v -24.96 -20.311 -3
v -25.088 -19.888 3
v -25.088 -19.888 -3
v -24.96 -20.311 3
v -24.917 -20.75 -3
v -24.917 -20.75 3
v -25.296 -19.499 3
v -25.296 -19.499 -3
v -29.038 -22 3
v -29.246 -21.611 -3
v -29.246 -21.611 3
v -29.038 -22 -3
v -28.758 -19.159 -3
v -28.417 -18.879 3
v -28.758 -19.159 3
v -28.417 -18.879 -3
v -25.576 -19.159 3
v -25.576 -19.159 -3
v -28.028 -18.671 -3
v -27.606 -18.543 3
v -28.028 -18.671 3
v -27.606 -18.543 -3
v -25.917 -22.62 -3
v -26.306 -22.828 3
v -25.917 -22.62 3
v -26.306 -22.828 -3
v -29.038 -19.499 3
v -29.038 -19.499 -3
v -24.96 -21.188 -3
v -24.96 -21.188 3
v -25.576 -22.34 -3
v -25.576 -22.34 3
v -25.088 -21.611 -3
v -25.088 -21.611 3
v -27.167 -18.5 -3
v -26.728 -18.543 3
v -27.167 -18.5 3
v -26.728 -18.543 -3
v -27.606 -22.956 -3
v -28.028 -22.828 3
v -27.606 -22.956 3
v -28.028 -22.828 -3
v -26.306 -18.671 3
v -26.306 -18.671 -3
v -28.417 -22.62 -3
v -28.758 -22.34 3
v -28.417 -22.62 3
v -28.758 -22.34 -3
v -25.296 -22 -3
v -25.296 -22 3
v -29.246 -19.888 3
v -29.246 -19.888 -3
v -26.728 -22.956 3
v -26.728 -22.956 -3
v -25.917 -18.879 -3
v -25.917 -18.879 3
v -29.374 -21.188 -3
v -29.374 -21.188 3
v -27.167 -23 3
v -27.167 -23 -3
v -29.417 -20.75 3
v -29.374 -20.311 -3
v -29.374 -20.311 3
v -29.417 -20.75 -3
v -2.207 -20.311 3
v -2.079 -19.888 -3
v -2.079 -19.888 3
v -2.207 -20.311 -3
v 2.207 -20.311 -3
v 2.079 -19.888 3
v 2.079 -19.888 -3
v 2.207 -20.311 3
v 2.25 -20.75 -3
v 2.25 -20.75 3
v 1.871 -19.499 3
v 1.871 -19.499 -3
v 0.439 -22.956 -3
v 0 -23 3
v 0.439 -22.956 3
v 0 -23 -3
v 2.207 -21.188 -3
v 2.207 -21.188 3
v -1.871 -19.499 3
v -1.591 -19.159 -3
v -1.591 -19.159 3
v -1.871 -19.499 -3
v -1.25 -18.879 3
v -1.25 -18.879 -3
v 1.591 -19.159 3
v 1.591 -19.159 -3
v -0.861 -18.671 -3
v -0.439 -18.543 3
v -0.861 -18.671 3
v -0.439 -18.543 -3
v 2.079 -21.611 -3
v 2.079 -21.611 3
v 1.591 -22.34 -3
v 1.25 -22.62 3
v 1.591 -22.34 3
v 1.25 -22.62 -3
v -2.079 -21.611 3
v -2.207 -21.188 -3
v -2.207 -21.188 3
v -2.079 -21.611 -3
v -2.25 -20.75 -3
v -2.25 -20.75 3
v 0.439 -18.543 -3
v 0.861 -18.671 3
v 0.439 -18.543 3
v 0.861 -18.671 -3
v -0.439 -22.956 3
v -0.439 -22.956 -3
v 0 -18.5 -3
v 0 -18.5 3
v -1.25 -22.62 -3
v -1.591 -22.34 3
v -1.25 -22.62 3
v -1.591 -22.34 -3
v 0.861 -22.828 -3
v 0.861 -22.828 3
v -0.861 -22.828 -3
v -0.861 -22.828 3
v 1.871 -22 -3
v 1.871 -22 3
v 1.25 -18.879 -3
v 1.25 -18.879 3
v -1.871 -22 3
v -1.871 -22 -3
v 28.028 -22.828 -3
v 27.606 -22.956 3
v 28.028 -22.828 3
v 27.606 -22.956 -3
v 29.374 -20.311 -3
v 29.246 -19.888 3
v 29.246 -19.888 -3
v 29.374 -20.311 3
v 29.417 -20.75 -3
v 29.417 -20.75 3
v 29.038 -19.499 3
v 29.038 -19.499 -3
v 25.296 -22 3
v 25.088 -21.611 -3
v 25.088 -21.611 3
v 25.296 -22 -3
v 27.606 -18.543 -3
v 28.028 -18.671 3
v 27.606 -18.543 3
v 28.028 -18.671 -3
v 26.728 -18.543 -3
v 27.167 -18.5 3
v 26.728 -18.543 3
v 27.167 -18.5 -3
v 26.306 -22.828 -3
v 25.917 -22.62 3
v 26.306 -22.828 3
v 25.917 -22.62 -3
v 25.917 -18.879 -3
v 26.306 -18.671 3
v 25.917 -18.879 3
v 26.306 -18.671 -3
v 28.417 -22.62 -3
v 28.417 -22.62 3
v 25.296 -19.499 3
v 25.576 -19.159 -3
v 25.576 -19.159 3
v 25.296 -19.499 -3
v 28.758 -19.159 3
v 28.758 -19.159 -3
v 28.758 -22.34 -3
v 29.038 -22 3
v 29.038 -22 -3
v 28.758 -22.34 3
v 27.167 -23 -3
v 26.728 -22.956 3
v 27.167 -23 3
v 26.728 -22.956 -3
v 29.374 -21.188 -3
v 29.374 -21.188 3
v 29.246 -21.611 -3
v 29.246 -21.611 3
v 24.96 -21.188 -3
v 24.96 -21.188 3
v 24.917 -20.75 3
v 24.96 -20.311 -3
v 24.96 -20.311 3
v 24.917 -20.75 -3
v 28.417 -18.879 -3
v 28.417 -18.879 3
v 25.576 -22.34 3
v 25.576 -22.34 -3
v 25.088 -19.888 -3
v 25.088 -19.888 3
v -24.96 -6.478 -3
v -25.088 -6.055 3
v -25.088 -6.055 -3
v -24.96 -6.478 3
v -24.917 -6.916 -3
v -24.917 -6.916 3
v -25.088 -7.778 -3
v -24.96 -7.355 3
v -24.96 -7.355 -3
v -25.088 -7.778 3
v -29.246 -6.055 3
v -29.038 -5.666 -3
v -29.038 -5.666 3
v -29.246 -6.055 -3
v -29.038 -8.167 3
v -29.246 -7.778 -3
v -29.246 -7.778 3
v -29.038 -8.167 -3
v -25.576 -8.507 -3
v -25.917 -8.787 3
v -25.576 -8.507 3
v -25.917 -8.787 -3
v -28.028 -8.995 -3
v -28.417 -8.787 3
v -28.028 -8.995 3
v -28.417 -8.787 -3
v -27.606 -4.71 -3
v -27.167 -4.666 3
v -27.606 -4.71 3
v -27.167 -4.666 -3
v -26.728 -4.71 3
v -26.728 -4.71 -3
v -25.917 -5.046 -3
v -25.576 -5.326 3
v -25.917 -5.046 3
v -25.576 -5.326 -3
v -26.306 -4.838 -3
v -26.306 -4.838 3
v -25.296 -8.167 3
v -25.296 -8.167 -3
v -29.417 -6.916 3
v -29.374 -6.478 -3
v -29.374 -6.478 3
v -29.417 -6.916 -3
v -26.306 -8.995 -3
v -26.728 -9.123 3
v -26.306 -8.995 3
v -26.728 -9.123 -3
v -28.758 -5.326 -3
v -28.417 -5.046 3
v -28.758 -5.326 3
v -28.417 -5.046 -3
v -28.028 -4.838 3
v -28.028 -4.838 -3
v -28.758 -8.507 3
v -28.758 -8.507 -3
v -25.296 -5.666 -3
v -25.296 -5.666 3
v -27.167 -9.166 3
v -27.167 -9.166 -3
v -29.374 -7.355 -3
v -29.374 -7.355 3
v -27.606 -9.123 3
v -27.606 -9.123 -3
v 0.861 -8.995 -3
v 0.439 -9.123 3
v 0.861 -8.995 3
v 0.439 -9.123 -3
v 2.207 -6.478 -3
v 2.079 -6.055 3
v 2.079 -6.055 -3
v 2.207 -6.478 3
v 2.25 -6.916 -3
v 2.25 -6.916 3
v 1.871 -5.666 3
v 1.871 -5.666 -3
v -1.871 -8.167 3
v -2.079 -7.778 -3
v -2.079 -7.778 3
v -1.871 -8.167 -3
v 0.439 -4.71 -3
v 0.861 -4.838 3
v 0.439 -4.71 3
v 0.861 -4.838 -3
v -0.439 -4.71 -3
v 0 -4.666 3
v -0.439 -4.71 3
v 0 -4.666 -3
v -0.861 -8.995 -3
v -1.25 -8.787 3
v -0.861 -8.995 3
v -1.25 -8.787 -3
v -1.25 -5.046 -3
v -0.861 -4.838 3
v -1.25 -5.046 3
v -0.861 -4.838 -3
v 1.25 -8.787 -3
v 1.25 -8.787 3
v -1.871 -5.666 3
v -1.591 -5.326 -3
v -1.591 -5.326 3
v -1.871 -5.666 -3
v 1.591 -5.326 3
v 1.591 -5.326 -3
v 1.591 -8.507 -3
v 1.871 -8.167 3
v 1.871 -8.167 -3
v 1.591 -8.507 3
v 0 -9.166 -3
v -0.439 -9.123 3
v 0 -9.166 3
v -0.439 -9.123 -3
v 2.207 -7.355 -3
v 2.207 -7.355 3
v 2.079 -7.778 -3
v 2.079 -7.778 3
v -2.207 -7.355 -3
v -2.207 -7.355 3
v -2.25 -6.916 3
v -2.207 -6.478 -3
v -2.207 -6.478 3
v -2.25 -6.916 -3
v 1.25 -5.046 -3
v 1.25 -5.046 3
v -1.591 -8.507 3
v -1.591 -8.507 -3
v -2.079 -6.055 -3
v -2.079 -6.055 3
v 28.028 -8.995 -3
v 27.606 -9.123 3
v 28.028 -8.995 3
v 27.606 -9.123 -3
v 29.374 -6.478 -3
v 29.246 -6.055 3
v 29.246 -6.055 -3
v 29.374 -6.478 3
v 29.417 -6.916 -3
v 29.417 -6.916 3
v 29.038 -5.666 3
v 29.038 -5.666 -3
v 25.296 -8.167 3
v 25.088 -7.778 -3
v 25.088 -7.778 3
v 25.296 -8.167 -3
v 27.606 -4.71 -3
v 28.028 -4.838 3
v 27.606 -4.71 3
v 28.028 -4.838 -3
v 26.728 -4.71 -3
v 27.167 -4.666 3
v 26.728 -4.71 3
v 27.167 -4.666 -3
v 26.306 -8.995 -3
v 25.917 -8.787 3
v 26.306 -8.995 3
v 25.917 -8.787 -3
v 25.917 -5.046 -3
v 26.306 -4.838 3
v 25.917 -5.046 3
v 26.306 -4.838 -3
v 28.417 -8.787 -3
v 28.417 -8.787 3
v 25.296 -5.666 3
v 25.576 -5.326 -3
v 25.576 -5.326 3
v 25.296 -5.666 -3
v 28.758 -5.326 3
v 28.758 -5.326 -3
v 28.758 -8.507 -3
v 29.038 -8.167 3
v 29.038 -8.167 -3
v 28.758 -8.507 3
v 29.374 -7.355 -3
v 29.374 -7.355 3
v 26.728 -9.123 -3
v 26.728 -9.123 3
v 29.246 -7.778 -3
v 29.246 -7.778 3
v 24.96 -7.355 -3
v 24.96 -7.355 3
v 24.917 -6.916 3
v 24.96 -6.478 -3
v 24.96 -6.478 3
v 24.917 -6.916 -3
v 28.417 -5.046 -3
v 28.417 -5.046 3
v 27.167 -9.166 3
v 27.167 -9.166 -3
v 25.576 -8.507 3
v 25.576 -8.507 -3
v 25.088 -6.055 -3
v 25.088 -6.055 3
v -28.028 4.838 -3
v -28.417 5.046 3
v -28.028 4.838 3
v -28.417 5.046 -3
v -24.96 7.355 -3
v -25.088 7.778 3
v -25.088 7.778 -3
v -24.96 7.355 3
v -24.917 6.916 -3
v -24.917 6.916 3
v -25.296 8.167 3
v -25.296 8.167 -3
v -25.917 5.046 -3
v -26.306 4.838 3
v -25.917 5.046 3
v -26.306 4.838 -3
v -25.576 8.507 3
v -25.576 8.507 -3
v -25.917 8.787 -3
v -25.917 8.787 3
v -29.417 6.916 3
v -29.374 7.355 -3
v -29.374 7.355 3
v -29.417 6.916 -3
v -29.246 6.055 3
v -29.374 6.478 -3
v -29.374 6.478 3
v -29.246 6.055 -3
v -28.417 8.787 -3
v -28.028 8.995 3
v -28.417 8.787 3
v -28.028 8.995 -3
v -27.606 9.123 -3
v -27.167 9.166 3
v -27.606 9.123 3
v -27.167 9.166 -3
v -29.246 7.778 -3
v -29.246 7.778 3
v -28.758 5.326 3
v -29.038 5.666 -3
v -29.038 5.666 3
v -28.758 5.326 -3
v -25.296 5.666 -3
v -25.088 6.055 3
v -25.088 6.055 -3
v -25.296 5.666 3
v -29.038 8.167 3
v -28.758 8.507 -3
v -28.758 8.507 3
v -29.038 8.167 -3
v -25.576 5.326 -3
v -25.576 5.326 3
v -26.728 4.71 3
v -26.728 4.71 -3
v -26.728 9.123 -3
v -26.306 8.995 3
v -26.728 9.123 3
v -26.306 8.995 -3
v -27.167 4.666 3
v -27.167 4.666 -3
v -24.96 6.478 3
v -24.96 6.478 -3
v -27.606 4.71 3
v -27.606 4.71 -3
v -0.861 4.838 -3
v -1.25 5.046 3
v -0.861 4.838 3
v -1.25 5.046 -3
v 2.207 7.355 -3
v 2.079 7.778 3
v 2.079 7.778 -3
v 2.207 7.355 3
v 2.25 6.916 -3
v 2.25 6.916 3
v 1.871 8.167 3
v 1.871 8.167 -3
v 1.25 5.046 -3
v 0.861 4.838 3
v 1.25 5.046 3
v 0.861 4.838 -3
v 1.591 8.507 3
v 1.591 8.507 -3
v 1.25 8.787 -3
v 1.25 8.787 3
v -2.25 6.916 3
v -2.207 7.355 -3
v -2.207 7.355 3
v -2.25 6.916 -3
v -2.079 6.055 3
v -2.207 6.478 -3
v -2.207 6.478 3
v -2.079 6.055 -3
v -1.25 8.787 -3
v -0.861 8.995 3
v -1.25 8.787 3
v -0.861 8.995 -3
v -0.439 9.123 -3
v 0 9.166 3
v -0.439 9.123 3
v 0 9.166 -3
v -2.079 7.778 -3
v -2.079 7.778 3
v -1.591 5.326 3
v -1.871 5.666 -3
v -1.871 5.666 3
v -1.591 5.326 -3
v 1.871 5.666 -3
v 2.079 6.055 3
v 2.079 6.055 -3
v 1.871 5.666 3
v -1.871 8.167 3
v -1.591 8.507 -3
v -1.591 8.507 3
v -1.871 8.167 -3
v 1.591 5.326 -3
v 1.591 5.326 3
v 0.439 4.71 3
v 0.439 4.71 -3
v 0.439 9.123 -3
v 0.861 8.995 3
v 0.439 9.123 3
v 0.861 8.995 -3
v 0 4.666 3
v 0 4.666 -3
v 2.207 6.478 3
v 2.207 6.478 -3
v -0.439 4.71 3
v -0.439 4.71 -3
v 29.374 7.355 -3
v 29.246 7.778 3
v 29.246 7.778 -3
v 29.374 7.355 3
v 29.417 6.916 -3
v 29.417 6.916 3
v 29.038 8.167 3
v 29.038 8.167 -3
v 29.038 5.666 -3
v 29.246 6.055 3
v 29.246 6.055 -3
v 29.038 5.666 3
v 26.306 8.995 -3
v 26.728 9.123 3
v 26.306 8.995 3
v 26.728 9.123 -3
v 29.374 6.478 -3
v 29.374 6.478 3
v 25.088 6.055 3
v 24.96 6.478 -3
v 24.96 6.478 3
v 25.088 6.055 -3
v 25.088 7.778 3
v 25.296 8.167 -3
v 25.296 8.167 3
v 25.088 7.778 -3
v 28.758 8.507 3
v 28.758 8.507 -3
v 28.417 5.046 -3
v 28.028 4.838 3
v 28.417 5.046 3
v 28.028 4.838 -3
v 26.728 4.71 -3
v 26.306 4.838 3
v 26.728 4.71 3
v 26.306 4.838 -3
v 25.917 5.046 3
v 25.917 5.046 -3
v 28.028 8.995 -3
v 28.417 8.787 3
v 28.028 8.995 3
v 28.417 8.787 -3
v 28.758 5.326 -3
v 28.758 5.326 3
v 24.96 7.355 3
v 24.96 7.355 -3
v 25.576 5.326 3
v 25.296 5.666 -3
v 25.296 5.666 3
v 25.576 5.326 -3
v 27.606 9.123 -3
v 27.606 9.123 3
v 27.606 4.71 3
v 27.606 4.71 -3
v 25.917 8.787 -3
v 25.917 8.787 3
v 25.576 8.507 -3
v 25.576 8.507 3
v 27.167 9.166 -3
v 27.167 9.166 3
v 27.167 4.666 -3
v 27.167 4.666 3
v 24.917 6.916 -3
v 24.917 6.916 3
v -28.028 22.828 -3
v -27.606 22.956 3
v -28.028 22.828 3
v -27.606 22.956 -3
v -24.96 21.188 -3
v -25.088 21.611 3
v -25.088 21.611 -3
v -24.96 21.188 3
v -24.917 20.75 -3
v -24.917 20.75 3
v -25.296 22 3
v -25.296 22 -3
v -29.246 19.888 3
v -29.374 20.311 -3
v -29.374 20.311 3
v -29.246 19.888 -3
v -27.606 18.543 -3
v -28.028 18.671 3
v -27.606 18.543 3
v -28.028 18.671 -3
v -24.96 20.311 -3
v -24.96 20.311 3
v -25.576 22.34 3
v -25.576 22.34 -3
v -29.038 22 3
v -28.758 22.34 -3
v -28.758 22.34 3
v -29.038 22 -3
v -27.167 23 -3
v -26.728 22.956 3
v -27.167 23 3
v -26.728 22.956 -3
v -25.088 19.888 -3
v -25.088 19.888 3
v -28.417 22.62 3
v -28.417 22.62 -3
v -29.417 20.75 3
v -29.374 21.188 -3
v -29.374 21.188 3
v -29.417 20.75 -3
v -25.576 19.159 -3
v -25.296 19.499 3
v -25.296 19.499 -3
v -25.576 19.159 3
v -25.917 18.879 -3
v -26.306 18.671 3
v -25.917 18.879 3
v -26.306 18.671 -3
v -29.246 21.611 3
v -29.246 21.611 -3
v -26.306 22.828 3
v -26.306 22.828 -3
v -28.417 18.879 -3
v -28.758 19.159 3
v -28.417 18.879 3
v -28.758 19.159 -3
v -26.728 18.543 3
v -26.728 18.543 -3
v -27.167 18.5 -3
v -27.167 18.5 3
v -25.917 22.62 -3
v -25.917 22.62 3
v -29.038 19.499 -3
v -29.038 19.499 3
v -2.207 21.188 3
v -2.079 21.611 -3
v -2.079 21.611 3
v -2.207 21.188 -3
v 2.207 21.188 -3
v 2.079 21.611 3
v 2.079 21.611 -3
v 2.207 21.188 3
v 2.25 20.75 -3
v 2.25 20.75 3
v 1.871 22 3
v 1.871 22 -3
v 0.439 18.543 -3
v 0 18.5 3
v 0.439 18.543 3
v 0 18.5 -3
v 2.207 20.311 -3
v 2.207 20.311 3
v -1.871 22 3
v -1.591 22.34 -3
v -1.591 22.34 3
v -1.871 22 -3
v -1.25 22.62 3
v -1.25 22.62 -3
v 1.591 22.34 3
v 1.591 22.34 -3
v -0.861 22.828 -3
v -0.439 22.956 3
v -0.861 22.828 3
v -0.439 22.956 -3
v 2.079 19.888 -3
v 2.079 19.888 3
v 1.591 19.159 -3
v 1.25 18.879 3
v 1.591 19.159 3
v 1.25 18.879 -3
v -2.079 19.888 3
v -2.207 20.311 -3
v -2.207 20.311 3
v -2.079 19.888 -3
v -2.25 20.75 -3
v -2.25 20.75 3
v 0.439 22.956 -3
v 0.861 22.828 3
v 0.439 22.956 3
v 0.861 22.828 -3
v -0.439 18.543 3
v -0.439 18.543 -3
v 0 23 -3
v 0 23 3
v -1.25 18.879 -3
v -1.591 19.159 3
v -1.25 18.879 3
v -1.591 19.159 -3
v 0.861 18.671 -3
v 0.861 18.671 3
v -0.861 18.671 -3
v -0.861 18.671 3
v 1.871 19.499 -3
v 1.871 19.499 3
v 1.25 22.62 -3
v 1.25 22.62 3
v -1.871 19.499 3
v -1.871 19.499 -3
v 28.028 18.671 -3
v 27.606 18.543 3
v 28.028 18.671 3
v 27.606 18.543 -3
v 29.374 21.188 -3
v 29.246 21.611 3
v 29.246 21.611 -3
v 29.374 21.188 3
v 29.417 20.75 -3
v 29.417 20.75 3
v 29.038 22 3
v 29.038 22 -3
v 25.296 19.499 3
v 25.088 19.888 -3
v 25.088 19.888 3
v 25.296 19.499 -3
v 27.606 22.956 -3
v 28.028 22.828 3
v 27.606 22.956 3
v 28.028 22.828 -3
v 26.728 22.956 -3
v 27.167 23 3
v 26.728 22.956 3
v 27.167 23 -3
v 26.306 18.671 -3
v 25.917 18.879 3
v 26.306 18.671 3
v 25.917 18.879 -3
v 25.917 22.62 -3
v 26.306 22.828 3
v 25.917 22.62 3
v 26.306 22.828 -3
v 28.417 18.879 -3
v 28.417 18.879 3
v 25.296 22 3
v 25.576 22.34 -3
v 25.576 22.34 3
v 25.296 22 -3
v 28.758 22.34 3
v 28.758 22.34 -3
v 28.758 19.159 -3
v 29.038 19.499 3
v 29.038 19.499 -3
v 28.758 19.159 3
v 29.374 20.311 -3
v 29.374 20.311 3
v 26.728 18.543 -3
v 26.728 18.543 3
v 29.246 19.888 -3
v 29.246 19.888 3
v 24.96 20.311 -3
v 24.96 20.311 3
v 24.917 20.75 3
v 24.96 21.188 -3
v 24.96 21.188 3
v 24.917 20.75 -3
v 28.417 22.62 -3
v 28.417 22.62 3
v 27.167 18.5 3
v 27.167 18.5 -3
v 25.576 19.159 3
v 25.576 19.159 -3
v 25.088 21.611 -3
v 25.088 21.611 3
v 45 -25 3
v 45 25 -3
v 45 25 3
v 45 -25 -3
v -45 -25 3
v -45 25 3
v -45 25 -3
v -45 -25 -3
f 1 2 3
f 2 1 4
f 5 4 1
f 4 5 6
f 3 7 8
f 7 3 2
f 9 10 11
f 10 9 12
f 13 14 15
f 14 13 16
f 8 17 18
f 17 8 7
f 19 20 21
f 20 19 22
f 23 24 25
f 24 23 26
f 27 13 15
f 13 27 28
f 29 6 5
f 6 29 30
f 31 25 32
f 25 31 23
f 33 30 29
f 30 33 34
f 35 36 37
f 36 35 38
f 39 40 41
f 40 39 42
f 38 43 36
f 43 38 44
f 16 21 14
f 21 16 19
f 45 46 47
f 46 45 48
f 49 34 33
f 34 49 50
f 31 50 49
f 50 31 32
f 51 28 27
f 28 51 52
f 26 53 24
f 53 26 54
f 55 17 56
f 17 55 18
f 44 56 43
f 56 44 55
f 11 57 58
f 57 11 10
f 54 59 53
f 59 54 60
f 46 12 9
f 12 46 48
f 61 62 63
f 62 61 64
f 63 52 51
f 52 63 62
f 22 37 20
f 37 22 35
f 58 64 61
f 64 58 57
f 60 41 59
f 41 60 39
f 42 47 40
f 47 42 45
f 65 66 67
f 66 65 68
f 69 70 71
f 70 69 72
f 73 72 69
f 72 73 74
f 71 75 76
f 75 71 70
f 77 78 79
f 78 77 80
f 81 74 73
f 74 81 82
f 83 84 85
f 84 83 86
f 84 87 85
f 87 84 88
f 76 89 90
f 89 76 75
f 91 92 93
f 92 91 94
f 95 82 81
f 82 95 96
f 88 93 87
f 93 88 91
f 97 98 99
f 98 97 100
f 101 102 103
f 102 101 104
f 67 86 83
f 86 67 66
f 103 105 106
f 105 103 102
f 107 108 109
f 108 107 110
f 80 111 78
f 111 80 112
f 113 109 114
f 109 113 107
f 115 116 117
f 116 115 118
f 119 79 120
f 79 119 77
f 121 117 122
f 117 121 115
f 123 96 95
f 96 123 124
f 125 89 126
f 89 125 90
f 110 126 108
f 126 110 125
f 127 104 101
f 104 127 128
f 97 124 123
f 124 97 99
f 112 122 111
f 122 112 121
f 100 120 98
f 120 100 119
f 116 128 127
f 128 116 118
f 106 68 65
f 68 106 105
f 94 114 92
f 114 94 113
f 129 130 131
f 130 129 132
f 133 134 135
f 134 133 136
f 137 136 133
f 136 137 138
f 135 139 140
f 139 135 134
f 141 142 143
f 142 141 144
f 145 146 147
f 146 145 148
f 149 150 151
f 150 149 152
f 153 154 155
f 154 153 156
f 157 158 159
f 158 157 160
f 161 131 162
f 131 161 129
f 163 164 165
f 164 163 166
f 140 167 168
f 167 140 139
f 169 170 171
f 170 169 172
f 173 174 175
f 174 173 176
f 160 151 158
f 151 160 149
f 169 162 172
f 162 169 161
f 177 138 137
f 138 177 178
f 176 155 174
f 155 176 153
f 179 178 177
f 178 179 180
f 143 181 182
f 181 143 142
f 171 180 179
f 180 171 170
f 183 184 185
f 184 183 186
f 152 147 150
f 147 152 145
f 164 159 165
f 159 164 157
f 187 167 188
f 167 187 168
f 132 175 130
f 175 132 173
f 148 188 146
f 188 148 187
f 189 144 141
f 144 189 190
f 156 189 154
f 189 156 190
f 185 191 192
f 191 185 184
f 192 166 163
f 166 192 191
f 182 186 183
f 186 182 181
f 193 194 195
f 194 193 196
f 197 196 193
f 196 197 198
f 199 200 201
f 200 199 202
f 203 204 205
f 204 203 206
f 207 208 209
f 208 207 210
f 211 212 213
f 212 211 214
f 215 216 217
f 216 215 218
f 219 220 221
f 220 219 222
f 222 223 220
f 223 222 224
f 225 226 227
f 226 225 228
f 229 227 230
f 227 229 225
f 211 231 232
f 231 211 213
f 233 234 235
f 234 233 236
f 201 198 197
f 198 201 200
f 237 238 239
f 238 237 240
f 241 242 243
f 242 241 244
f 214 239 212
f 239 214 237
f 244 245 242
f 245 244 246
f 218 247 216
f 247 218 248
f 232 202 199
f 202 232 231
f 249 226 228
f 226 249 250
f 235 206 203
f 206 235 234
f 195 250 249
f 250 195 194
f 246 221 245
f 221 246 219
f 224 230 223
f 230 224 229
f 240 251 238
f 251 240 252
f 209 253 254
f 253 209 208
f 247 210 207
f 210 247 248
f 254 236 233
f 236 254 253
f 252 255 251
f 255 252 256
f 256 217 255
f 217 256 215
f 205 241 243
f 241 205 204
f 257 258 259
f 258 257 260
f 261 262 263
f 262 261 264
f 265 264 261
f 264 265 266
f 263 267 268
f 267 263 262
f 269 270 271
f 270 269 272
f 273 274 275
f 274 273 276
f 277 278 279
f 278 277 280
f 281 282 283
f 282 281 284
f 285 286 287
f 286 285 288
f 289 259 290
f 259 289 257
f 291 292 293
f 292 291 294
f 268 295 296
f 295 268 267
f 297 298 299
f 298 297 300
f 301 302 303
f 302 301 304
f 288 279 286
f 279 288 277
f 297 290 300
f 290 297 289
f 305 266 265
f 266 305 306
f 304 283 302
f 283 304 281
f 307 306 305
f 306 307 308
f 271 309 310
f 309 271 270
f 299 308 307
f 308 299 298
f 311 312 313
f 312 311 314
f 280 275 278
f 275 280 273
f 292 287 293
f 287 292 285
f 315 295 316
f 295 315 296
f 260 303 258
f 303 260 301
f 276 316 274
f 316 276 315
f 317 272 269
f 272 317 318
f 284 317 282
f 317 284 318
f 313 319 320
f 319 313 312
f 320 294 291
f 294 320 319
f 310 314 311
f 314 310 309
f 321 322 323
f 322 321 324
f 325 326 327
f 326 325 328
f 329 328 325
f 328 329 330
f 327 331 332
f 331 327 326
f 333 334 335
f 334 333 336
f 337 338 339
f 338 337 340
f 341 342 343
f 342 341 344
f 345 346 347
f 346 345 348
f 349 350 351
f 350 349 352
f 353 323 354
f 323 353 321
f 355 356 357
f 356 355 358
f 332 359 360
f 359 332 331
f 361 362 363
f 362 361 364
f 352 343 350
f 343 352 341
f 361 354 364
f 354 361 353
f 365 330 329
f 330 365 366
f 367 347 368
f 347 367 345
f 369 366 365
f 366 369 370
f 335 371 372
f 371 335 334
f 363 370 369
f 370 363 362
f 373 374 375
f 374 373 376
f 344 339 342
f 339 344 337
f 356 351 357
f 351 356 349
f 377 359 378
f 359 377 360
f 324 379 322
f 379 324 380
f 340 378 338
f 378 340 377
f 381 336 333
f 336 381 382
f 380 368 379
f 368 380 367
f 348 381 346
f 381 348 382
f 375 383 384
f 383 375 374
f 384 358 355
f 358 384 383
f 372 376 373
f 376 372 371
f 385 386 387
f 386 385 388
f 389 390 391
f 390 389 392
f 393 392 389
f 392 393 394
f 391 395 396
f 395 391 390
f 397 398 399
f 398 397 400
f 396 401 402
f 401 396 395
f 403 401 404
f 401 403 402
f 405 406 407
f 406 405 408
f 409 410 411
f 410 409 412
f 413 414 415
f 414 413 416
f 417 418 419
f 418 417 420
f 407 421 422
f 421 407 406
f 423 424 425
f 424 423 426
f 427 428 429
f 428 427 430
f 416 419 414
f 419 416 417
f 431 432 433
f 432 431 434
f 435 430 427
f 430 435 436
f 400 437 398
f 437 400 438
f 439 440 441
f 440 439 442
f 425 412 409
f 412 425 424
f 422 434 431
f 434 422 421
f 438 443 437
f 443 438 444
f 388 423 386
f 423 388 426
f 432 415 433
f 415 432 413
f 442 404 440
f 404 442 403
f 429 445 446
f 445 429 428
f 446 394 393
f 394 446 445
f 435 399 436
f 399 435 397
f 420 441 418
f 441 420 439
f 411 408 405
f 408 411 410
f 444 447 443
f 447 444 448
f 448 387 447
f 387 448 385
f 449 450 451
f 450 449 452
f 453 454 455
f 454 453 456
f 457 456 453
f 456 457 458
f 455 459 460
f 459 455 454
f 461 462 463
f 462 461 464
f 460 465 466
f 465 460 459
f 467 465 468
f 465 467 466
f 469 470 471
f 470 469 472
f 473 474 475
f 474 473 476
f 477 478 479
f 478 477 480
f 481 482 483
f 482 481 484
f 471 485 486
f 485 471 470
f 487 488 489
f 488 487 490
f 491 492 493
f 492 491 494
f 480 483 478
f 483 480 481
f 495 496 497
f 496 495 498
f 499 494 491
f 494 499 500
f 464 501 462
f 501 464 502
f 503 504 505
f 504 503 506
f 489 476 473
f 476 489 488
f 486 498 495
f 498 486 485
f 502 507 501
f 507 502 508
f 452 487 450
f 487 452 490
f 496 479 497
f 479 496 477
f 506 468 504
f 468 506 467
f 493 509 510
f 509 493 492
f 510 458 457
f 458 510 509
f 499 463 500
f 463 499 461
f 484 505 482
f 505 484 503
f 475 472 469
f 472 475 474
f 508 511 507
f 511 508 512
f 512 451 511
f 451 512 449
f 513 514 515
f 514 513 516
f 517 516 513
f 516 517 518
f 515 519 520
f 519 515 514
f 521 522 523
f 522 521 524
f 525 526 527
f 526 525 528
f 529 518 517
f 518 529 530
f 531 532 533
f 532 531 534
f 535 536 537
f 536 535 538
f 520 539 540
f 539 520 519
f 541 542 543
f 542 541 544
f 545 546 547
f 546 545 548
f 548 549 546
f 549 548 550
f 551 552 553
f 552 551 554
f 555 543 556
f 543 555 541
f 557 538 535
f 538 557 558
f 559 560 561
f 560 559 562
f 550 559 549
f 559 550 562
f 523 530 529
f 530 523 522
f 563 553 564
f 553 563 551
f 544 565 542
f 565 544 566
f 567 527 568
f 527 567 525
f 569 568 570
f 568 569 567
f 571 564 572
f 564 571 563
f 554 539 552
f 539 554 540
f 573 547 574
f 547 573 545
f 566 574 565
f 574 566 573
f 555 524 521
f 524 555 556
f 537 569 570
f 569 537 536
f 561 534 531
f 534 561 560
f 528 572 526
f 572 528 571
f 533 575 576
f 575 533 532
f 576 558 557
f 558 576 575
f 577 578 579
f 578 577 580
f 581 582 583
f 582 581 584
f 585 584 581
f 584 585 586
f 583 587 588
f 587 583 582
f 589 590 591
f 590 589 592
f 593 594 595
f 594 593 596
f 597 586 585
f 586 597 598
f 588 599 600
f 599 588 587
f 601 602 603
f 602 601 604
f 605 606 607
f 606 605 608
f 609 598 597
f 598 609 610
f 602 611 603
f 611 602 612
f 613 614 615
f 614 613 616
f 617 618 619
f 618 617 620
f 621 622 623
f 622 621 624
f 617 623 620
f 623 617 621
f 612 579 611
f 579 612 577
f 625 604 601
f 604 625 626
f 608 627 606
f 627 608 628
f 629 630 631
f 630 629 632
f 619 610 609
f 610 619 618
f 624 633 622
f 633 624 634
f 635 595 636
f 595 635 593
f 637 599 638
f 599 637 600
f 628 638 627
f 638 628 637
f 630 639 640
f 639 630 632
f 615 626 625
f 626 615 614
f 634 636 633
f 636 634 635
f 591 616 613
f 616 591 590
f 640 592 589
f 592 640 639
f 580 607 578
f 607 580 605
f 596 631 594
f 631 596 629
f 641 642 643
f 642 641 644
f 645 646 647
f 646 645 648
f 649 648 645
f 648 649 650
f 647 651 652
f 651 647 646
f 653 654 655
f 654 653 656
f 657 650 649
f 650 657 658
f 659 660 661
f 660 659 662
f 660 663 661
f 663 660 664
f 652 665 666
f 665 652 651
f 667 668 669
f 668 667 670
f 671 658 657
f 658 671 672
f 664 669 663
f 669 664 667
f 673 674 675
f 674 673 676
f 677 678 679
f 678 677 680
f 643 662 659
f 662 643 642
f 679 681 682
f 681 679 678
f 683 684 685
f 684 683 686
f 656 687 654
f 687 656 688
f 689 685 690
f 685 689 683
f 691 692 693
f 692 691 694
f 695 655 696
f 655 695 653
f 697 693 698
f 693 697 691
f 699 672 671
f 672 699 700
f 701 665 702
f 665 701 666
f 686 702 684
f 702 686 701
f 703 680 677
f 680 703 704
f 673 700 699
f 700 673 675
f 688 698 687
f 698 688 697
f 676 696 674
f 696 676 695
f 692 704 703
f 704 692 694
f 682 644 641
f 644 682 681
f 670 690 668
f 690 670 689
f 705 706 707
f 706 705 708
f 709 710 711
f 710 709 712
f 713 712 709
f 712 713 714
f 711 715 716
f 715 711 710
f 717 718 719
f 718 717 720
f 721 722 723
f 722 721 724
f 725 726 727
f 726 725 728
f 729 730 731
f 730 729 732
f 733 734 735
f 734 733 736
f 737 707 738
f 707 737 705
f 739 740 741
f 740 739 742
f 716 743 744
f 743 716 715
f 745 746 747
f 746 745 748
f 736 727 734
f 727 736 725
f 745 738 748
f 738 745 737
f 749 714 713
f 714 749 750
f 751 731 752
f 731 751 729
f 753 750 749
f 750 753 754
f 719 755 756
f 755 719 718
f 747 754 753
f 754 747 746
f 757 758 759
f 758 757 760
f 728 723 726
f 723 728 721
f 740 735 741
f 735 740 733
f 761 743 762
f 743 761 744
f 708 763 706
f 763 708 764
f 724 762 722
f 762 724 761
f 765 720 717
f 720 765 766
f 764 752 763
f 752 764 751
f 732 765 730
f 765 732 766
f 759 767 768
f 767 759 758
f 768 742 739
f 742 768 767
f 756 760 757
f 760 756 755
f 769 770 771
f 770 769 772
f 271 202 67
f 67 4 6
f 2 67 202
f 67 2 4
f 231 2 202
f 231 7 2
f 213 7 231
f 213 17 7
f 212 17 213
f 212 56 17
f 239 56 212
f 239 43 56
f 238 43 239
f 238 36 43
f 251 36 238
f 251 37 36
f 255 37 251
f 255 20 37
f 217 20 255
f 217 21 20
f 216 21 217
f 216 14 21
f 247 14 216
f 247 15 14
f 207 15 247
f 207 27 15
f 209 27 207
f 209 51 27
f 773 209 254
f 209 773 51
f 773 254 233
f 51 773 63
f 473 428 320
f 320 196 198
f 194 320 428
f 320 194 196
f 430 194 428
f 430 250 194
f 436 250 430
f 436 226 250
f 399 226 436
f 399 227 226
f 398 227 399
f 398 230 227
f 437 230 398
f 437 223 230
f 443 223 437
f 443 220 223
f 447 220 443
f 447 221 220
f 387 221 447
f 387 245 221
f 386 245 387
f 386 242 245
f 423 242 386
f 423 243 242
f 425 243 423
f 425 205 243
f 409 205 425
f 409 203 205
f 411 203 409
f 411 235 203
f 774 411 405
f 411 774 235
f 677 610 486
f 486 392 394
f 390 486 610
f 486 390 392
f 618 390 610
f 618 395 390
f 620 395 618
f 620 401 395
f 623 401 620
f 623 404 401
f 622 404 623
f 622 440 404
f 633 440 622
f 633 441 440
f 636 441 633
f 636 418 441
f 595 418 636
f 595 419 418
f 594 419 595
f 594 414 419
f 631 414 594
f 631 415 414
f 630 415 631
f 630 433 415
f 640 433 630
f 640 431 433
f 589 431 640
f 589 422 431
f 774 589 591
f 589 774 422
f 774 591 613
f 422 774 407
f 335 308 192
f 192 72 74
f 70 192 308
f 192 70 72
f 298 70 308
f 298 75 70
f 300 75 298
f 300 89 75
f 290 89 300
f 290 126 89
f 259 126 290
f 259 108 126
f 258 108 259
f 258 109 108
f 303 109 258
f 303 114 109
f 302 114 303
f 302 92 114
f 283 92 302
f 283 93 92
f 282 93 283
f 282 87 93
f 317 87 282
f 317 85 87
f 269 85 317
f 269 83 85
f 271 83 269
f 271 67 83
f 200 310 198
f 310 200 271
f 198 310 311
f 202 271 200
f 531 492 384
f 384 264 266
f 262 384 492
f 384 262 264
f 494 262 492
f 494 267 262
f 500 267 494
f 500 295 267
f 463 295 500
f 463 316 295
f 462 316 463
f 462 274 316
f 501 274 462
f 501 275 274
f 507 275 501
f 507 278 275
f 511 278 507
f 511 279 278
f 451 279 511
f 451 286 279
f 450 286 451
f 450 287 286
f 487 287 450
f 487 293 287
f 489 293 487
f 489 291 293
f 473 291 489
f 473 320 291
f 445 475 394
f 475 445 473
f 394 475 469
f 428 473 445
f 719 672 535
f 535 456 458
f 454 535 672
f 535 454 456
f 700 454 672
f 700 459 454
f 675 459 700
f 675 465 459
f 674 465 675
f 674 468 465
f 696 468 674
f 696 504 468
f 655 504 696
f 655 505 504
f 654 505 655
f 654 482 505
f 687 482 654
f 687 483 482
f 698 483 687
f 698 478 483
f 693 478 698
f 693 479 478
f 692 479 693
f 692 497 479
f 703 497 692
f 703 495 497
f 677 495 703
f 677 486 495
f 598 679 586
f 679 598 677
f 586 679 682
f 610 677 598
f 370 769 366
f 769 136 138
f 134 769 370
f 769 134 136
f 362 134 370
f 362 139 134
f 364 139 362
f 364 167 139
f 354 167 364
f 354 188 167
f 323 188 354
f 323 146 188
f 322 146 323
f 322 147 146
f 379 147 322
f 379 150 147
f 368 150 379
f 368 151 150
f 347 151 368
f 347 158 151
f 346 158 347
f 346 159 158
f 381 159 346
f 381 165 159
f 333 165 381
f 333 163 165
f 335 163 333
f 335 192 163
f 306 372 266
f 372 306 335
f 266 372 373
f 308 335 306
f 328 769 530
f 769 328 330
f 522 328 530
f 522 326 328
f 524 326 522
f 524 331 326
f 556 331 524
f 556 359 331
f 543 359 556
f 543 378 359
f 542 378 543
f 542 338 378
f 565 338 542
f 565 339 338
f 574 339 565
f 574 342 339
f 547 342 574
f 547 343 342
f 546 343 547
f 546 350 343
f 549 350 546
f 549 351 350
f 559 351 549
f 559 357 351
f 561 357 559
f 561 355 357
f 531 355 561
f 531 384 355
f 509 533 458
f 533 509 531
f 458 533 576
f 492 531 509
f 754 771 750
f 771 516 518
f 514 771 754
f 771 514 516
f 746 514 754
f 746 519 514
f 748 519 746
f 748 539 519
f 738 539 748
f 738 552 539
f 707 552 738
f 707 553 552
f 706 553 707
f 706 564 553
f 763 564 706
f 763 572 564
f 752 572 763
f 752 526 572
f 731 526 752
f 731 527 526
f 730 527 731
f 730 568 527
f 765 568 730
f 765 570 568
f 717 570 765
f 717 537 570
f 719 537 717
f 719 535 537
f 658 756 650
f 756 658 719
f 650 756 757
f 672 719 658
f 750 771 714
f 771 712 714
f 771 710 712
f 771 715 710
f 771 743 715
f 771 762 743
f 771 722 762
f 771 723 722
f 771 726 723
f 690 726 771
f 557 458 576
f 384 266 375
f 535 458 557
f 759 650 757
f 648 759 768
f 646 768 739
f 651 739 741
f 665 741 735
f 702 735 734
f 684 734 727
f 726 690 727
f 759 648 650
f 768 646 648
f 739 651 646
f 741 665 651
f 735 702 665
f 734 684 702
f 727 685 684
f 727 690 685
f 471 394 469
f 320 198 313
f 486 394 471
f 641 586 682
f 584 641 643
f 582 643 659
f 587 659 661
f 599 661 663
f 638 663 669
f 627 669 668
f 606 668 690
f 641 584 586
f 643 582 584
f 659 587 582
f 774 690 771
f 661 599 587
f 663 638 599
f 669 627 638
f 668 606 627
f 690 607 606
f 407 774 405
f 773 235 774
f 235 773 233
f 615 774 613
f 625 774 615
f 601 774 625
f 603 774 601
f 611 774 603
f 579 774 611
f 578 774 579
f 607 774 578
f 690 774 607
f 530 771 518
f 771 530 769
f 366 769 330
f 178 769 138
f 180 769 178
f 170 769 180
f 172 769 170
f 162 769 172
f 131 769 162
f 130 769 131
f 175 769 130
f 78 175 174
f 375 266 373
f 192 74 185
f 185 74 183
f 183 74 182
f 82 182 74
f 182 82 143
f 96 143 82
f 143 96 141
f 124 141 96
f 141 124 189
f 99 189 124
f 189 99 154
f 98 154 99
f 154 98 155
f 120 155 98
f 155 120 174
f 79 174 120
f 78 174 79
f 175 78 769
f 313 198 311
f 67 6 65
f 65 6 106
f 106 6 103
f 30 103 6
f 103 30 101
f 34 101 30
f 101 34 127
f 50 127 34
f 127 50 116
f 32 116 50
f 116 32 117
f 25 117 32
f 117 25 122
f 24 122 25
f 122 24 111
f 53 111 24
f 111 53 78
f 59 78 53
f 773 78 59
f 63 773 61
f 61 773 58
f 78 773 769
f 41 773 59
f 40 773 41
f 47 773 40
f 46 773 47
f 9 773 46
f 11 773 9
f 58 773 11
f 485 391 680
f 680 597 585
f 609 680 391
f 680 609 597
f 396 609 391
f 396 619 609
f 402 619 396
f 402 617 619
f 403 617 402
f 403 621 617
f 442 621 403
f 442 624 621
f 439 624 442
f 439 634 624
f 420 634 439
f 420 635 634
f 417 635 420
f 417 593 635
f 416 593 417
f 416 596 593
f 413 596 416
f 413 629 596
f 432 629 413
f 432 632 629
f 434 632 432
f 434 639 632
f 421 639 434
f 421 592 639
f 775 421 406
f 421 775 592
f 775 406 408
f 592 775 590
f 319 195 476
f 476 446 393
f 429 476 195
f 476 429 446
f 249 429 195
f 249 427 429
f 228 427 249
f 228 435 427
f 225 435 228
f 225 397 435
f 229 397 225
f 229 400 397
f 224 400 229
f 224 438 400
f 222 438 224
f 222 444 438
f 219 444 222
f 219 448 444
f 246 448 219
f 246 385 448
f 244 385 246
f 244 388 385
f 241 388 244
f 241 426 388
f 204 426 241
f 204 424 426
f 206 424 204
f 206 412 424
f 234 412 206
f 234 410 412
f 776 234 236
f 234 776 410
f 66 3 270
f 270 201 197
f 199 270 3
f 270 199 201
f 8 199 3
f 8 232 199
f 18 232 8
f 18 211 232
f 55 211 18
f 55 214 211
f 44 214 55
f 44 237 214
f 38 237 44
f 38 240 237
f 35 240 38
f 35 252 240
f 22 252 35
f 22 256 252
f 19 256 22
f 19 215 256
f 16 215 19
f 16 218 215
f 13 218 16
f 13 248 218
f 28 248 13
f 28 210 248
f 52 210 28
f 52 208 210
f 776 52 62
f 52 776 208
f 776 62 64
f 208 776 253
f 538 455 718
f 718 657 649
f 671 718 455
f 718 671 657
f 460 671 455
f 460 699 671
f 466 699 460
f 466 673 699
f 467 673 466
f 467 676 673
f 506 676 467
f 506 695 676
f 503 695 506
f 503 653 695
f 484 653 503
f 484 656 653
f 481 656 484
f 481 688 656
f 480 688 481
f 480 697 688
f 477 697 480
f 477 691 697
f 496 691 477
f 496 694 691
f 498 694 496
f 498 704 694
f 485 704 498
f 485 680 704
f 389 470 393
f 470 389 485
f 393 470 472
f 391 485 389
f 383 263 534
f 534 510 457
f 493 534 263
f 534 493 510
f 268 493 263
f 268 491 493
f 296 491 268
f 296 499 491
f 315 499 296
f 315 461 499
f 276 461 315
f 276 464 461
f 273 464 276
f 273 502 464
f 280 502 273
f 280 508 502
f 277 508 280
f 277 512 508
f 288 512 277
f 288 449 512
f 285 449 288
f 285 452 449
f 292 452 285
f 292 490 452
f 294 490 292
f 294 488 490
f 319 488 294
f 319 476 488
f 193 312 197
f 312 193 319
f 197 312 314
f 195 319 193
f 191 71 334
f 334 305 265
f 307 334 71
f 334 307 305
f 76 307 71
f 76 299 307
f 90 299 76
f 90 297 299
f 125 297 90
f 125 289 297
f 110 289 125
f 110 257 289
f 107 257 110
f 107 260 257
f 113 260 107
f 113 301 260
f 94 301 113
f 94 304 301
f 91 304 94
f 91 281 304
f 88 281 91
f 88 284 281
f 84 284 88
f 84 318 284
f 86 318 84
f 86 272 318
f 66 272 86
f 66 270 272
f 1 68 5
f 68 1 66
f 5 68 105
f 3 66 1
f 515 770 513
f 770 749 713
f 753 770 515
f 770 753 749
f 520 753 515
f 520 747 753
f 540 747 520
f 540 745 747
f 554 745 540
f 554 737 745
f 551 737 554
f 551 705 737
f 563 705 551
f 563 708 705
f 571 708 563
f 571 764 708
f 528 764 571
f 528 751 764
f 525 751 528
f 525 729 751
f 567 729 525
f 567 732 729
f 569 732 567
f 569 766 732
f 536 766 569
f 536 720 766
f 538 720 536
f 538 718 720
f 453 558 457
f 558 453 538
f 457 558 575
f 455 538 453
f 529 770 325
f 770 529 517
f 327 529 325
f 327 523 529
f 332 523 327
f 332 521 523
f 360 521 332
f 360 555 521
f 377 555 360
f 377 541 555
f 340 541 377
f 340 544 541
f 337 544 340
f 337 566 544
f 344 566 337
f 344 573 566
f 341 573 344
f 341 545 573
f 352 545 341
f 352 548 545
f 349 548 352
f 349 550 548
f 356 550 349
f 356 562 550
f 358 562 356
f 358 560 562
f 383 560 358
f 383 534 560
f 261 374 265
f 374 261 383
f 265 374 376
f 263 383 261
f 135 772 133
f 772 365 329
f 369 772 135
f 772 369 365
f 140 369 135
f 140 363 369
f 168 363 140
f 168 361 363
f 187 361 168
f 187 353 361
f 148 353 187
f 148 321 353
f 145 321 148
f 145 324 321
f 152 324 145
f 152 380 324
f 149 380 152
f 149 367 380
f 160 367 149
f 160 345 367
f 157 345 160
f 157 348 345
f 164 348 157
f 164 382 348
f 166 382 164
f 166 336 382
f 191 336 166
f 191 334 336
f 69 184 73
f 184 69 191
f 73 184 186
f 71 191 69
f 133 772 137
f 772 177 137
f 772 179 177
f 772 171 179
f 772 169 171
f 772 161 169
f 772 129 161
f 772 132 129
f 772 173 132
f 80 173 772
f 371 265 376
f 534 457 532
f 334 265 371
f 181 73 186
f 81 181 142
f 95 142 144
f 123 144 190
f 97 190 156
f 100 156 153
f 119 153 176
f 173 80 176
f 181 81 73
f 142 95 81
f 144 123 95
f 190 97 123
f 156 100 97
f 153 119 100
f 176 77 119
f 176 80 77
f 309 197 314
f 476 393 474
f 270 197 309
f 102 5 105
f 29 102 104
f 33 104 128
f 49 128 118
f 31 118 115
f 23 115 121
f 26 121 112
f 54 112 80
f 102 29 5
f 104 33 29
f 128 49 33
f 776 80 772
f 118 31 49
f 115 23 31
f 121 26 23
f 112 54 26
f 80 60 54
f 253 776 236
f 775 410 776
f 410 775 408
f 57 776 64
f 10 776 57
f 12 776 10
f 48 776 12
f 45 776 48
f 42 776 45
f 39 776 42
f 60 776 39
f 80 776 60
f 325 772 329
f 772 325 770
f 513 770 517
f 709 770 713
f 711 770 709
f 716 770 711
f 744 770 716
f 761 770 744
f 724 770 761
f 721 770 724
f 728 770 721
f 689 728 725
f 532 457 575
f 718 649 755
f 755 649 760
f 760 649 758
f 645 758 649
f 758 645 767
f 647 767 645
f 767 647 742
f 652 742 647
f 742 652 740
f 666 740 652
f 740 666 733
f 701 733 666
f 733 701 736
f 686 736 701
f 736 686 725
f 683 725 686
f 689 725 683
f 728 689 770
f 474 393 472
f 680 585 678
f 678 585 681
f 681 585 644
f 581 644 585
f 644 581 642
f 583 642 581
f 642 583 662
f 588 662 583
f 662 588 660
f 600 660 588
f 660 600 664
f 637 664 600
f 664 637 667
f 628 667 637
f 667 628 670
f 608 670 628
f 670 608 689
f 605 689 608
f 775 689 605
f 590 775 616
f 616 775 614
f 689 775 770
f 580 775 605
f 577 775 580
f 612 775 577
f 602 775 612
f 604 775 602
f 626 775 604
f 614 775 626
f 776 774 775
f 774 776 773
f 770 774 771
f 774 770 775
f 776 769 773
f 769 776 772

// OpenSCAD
$fn = 32;

// ----------------------------------------------------------------------
// Perforated panel 90 x 50 x 6
// 4 x 3 Ø4.5 holes, grid layout
// ----------------------------------------------------------------------

// --- parameters (mm) ---
panel = [90, 50, 6];  // overall size (x, y, z)
hole_d = 4.5;         // hole diameter
pitch_x = 27.167;     // hole pitch along X
pitch_y = 13.833;     // hole pitch along Y

// --- derived feature positions (mm) ---
margin = hole_d / 2 + 2;            // = 4.25   clearance from the panel edge
cols = floor((panel[0] - 2 * margin) / pitch_x) + 1;  // = 3   how many columns fit in X
rows = floor((panel[1] - 2 * margin) / pitch_y) + 1;  // = 4   how many rows fit in Y
span_x = (cols - 1) * pitch_x + 0;  // = 54.33   width of the field
span_y = (rows - 1) * pitch_y;      // = 41.5   height of the field
origin_x = -span_x / 2;             // = -27.17   X of the first hole
origin_y = -span_y / 2;             // = -20.75   Y of the first row
holes = rows * cols;                // = 12   holes in total
feature_centers = [
  [origin_x + 0 * pitch_x, origin_y + 0 * pitch_y],
  [origin_x + 1 * pitch_x, origin_y + 0 * pitch_y],
  [origin_x + 2 * pitch_x, origin_y + 0 * pitch_y],
  [origin_x + 0 * pitch_x, origin_y + 1 * pitch_y],
  [origin_x + 1 * pitch_x, origin_y + 1 * pitch_y],
  [origin_x + 2 * pitch_x, origin_y + 1 * pitch_y],
  [origin_x + 0 * pitch_x, origin_y + 2 * pitch_y],
  [origin_x + 1 * pitch_x, origin_y + 2 * pitch_y],
  [origin_x + 2 * pitch_x, origin_y + 2 * pitch_y],
  [origin_x + 0 * pitch_x, origin_y + 3 * pitch_y],
  [origin_x + 1 * pitch_x, origin_y + 3 * pitch_y],
  [origin_x + 2 * pitch_x, origin_y + 3 * pitch_y]
];   // hole centres, used verbatim by the cutter loop

// panel outline, every hole through
difference() {
  cube(panel, center = true);
  for (centre = feature_centers)
    translate([centre[0], centre[1], 0])
      cylinder(d = hole_d, h = panel[2] + 2, center = true);
}
